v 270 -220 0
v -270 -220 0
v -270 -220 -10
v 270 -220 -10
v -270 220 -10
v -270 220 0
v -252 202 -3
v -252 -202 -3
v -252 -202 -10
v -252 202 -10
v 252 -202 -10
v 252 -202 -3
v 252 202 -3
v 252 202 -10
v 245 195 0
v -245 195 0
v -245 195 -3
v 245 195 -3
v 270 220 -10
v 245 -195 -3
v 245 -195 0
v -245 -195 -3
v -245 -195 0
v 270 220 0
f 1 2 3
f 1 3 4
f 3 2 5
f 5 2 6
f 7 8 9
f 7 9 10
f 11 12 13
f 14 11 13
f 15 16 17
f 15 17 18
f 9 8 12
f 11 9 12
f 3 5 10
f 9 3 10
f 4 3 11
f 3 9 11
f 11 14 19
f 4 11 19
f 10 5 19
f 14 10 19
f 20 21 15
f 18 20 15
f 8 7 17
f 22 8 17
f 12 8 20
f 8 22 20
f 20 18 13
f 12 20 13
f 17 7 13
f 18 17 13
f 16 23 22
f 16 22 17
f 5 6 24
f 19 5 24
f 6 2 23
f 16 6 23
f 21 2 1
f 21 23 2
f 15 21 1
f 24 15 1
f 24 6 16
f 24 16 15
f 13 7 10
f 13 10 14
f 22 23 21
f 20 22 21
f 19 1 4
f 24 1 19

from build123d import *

# Parameters (mm, degrees)
F0_W     = 540
F0_H     = 440
F0_W_2   = 504
F0_H_2   = 404
F0_W_3   = 490
F0_H_3   = 390
F1_DEPTH = 3
F2_DEPTH = 10


with BuildPart() as f1:
    # F0 (on Top) → F1 (new body)
    with BuildSketch(Plane.XY):
        Rectangle(F0_W, F0_H)
        Rectangle(F0_W_2, F0_H_2, mode=Mode.SUBTRACT)
        Rectangle(F0_W_2, F0_H_2)
        Rectangle(F0_W_3, F0_H_3, mode=Mode.SUBTRACT)
    extrude(amount=-F1_DEPTH)

    # F0 (on Top) → F2 (join)
    with BuildSketch(Plane.XY):
        Rectangle(F0_W, F0_H)
        Rectangle(F0_W_2, F0_H_2, mode=Mode.SUBTRACT)
    extrude(amount=-F2_DEPTH)


solid = f1.part
